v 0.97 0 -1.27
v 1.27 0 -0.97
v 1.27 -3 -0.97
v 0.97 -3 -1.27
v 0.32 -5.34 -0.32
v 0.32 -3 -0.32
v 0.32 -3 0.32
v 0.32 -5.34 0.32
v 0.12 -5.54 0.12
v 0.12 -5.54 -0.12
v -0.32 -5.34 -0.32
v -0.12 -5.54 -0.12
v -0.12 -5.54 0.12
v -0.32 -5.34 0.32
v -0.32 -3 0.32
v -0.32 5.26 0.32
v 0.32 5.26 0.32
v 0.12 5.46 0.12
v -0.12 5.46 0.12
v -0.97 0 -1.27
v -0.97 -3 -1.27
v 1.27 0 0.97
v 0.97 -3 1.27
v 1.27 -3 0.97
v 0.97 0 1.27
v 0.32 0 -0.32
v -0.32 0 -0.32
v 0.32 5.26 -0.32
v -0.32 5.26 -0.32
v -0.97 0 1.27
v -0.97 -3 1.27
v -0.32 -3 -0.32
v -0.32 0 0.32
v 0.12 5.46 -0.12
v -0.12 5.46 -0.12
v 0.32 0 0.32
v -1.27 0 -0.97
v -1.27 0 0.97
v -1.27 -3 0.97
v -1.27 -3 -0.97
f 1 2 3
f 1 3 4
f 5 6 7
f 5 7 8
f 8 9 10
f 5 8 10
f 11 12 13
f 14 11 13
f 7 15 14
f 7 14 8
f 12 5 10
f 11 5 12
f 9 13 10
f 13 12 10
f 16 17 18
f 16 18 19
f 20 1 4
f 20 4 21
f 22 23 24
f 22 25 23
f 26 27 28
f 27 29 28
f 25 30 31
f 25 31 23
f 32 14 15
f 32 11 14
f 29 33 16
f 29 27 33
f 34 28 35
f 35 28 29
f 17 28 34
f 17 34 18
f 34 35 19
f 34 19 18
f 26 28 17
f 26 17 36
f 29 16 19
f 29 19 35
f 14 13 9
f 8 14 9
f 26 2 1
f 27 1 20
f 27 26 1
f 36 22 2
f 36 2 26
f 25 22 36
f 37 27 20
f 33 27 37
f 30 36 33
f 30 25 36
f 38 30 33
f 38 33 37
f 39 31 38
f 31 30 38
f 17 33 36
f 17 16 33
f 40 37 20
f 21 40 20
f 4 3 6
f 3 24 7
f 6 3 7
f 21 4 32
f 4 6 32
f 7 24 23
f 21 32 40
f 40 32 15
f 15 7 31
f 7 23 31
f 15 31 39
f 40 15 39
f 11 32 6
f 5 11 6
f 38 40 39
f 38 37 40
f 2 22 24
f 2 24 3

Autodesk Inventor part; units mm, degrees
ref_plane "YZ Plane" through (0, 0, 0) normal (1, 0, 0) x (0, 1, 0)
ref_plane "XZ Plane" through (0, 0, 0) normal (0, 1, 0) x (-1, 0, 0)
ref_plane "XY Plane" through (0, 0, 0) normal (0, 0, 1) x (1, 0, 0)
sketch "Boceto39" plane through (0, 0, 0) normal (0, 0, 1) x (1, 0, 0)
  line L0 (-0.32, 5.46) -> (0.32, 5.46)
  line L1 (0.32, 5.46) -> (0.32, 0)
  line L2 (0.32, 0) -> (-0.32, 0)
  line L3 (-0.32, 0) -> (-0.32, 5.46)
  line L4 (0.32, 0) -> (-0.32, 0)
  line L5 (-0.32, 0) -> (-0.32, -5.54)
  line L6 (-0.32, -5.54) -> (0.32, -5.54)
  line L7 (0.32, -5.54) -> (0.32, 0)
  point P0 (0, 0)
  point P1 (0, 5.46)
  point P2 (0, 0)
  dimension "d373" = 0.64
  dimension "d375" = 5.54
  dimension "d392" = 11
  dimension "d393" = 5.46
extrude "Extrusión13" add sketch "Boceto39" along normal mid plane 0.64
chamfer "Chaflán5" distance 0.2 angle 45 8 edges at (0.32, 5.46, 0) (0, 5.46, 0.32) (-0.32, 5.46, 0) (0, 5.46, -0.32) (-0.32, -5.54, 0) (0, -5.54, 0.32) (0.32, -5.54, 0) (0, -5.54, -0.32)
sketch "Boceto40" plane through (0, 0, 0) normal (0, 1, 0) x (-1, 0, 0)
  line L0 (-0.97, -1.27) -> (0.97, -1.27)
  line L1 (1.27, -0.97) -> (1.27, 0.97)
  line L2 (0.97, 1.27) -> (-0.97, 1.27)
  line L3 (-1.27, 0.97) -> (-1.27, -0.97)
  line L4 (-1.27, -0.97) -> (-0.97, -1.27)
  line L5 (1.27, -0.97) -> (0.97, -1.27)
  line L6 (0.97, 1.27) -> (1.27, 0.97)
  line L7 (-0.97, 1.27) -> (-1.27, 0.97)
  point P0 (0, 0)
  point P1 (-1.27, -1.27)
  point P2 (1.27, 1.27)
  point P3 (1.27, -1.27)
  point P4 (-1.27, 1.27)
  point P5 (0, -1.27)
  point P6 (-1.27, 0)
  dimension "d381" = 2.54
  dimension "d382" = 0.3
  dimension "d383" = 0.3
  dimension "d384" = 0.3
  dimension "d385" = 0.3
  dimension "d386" = 0.3
  dimension "d387" = 0.3
  dimension "d388" = 0.3
  dimension "d389" = 0.3
extrude "Extrusión14" add sketch "Boceto40" against normal blind 3
properties part number "CON-PIN-L11"
